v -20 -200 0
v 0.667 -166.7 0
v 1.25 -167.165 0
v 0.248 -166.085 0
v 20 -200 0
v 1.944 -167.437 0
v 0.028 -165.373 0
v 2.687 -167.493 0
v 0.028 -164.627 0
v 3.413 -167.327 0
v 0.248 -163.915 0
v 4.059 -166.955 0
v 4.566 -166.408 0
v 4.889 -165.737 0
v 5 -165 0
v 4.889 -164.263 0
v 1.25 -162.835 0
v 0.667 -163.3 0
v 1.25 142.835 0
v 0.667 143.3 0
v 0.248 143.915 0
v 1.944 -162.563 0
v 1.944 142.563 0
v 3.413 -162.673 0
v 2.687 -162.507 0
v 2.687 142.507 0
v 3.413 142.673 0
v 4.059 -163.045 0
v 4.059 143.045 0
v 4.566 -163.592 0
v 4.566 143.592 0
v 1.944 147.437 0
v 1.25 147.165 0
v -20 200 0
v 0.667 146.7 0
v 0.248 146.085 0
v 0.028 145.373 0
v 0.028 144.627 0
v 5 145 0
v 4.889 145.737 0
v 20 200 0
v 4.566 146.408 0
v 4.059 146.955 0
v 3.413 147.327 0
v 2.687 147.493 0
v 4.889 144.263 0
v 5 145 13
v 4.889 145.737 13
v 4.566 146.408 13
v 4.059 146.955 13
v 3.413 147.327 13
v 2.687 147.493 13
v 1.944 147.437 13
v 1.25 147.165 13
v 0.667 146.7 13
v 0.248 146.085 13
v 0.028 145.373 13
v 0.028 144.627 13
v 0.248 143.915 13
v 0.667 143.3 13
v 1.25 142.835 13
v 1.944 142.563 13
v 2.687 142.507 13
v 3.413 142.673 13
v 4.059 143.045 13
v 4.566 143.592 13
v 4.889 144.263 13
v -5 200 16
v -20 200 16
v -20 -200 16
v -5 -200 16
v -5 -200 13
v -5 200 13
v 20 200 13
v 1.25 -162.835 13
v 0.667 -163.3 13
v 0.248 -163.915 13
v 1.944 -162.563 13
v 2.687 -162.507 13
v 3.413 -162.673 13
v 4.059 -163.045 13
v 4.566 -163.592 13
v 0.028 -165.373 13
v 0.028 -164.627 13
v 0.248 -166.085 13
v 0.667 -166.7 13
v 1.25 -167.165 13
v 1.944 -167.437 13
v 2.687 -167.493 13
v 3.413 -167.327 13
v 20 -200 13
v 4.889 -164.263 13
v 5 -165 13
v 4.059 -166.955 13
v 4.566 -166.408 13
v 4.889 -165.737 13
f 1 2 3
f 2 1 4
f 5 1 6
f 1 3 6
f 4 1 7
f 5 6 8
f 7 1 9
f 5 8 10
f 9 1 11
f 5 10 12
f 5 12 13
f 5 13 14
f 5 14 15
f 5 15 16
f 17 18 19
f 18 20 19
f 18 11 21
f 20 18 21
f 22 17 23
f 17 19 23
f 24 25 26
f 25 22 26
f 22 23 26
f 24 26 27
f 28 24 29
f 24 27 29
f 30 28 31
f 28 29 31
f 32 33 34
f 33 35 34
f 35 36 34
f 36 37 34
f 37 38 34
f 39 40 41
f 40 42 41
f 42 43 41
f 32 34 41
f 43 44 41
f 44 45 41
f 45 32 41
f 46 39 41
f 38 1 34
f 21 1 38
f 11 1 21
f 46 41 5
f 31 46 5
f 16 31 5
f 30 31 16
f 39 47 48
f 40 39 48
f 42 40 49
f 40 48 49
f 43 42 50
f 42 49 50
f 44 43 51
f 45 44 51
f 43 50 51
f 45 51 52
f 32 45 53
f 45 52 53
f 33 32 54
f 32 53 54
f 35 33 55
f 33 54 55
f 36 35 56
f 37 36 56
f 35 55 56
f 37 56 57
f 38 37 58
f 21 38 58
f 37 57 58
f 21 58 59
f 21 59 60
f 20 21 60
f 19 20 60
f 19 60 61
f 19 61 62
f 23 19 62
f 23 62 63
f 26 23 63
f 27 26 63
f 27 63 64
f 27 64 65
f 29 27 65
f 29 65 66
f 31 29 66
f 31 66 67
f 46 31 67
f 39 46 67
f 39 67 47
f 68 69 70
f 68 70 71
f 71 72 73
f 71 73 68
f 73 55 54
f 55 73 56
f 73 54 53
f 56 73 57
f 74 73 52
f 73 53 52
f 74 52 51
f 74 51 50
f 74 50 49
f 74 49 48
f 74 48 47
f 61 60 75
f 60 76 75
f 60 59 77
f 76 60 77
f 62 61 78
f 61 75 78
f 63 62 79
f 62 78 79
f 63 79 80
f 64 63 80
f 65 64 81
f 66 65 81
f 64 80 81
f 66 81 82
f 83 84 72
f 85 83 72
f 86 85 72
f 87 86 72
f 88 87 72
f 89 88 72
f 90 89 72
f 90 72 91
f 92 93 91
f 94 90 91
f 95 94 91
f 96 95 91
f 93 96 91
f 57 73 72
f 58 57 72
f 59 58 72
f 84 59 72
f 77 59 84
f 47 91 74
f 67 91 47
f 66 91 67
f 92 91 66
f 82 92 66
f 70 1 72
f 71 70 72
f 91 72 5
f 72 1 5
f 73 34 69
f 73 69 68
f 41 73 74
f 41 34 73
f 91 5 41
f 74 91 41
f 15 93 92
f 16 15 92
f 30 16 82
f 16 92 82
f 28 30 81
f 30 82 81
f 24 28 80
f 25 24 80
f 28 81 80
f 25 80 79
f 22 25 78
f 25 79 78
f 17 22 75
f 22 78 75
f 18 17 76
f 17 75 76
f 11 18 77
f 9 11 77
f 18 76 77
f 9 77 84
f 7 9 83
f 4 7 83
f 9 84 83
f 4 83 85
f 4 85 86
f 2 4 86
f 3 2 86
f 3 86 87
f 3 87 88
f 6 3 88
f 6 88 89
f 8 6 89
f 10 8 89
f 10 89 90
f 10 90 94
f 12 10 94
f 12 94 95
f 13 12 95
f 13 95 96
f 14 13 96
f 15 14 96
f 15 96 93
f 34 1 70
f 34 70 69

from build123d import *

# Parameters (mm, degrees)
SKETCH1_W         = 40
SKETCH1_H         = 400
EXTRUDE1_DEPTH    = 16
EXTRUDE2_REACH    = 402
SKETCH2_W         = 25
SKETCH2_H         = 3
M6_TAPPED_HOLE1_D = 5


with BuildPart() as part:
    # Sketch1 → Extrude1 (new body)
    with BuildSketch(Plane.XY):
        Rectangle(SKETCH1_W, SKETCH1_H)
    extrude(amount=EXTRUDE1_DEPTH)

    # Sketch2 → Extrude2 (cut, up to next)
    with BuildSketch(Plane.XZ.offset(200), mode=Mode.PRIVATE) as extrude2_sk1:
        with Locations((7.5, 14.5)):
            Rectangle(SKETCH2_W, SKETCH2_H)
    extrude2_tool1 = extrude(extrude2_sk1.sketch, amount=-EXTRUDE2_REACH, mode=Mode.PRIVATE) & part.part
    add(extrude2_tool1.solids().sort_by_distance((7.5, -200, 14.5))[0], mode=Mode.SUBTRACT)

    # M6 Tapped Hole1 (through all)
    with Locations(Plane(origin=(0, 0, 0), x_dir=(-1, 0, 0), z_dir=(0, 0, -1))):
        with Locations((-2.5, 145), (-2.5, -165)):
            Hole(M6_TAPPED_HOLE1_D / 2)


solid = part.part
